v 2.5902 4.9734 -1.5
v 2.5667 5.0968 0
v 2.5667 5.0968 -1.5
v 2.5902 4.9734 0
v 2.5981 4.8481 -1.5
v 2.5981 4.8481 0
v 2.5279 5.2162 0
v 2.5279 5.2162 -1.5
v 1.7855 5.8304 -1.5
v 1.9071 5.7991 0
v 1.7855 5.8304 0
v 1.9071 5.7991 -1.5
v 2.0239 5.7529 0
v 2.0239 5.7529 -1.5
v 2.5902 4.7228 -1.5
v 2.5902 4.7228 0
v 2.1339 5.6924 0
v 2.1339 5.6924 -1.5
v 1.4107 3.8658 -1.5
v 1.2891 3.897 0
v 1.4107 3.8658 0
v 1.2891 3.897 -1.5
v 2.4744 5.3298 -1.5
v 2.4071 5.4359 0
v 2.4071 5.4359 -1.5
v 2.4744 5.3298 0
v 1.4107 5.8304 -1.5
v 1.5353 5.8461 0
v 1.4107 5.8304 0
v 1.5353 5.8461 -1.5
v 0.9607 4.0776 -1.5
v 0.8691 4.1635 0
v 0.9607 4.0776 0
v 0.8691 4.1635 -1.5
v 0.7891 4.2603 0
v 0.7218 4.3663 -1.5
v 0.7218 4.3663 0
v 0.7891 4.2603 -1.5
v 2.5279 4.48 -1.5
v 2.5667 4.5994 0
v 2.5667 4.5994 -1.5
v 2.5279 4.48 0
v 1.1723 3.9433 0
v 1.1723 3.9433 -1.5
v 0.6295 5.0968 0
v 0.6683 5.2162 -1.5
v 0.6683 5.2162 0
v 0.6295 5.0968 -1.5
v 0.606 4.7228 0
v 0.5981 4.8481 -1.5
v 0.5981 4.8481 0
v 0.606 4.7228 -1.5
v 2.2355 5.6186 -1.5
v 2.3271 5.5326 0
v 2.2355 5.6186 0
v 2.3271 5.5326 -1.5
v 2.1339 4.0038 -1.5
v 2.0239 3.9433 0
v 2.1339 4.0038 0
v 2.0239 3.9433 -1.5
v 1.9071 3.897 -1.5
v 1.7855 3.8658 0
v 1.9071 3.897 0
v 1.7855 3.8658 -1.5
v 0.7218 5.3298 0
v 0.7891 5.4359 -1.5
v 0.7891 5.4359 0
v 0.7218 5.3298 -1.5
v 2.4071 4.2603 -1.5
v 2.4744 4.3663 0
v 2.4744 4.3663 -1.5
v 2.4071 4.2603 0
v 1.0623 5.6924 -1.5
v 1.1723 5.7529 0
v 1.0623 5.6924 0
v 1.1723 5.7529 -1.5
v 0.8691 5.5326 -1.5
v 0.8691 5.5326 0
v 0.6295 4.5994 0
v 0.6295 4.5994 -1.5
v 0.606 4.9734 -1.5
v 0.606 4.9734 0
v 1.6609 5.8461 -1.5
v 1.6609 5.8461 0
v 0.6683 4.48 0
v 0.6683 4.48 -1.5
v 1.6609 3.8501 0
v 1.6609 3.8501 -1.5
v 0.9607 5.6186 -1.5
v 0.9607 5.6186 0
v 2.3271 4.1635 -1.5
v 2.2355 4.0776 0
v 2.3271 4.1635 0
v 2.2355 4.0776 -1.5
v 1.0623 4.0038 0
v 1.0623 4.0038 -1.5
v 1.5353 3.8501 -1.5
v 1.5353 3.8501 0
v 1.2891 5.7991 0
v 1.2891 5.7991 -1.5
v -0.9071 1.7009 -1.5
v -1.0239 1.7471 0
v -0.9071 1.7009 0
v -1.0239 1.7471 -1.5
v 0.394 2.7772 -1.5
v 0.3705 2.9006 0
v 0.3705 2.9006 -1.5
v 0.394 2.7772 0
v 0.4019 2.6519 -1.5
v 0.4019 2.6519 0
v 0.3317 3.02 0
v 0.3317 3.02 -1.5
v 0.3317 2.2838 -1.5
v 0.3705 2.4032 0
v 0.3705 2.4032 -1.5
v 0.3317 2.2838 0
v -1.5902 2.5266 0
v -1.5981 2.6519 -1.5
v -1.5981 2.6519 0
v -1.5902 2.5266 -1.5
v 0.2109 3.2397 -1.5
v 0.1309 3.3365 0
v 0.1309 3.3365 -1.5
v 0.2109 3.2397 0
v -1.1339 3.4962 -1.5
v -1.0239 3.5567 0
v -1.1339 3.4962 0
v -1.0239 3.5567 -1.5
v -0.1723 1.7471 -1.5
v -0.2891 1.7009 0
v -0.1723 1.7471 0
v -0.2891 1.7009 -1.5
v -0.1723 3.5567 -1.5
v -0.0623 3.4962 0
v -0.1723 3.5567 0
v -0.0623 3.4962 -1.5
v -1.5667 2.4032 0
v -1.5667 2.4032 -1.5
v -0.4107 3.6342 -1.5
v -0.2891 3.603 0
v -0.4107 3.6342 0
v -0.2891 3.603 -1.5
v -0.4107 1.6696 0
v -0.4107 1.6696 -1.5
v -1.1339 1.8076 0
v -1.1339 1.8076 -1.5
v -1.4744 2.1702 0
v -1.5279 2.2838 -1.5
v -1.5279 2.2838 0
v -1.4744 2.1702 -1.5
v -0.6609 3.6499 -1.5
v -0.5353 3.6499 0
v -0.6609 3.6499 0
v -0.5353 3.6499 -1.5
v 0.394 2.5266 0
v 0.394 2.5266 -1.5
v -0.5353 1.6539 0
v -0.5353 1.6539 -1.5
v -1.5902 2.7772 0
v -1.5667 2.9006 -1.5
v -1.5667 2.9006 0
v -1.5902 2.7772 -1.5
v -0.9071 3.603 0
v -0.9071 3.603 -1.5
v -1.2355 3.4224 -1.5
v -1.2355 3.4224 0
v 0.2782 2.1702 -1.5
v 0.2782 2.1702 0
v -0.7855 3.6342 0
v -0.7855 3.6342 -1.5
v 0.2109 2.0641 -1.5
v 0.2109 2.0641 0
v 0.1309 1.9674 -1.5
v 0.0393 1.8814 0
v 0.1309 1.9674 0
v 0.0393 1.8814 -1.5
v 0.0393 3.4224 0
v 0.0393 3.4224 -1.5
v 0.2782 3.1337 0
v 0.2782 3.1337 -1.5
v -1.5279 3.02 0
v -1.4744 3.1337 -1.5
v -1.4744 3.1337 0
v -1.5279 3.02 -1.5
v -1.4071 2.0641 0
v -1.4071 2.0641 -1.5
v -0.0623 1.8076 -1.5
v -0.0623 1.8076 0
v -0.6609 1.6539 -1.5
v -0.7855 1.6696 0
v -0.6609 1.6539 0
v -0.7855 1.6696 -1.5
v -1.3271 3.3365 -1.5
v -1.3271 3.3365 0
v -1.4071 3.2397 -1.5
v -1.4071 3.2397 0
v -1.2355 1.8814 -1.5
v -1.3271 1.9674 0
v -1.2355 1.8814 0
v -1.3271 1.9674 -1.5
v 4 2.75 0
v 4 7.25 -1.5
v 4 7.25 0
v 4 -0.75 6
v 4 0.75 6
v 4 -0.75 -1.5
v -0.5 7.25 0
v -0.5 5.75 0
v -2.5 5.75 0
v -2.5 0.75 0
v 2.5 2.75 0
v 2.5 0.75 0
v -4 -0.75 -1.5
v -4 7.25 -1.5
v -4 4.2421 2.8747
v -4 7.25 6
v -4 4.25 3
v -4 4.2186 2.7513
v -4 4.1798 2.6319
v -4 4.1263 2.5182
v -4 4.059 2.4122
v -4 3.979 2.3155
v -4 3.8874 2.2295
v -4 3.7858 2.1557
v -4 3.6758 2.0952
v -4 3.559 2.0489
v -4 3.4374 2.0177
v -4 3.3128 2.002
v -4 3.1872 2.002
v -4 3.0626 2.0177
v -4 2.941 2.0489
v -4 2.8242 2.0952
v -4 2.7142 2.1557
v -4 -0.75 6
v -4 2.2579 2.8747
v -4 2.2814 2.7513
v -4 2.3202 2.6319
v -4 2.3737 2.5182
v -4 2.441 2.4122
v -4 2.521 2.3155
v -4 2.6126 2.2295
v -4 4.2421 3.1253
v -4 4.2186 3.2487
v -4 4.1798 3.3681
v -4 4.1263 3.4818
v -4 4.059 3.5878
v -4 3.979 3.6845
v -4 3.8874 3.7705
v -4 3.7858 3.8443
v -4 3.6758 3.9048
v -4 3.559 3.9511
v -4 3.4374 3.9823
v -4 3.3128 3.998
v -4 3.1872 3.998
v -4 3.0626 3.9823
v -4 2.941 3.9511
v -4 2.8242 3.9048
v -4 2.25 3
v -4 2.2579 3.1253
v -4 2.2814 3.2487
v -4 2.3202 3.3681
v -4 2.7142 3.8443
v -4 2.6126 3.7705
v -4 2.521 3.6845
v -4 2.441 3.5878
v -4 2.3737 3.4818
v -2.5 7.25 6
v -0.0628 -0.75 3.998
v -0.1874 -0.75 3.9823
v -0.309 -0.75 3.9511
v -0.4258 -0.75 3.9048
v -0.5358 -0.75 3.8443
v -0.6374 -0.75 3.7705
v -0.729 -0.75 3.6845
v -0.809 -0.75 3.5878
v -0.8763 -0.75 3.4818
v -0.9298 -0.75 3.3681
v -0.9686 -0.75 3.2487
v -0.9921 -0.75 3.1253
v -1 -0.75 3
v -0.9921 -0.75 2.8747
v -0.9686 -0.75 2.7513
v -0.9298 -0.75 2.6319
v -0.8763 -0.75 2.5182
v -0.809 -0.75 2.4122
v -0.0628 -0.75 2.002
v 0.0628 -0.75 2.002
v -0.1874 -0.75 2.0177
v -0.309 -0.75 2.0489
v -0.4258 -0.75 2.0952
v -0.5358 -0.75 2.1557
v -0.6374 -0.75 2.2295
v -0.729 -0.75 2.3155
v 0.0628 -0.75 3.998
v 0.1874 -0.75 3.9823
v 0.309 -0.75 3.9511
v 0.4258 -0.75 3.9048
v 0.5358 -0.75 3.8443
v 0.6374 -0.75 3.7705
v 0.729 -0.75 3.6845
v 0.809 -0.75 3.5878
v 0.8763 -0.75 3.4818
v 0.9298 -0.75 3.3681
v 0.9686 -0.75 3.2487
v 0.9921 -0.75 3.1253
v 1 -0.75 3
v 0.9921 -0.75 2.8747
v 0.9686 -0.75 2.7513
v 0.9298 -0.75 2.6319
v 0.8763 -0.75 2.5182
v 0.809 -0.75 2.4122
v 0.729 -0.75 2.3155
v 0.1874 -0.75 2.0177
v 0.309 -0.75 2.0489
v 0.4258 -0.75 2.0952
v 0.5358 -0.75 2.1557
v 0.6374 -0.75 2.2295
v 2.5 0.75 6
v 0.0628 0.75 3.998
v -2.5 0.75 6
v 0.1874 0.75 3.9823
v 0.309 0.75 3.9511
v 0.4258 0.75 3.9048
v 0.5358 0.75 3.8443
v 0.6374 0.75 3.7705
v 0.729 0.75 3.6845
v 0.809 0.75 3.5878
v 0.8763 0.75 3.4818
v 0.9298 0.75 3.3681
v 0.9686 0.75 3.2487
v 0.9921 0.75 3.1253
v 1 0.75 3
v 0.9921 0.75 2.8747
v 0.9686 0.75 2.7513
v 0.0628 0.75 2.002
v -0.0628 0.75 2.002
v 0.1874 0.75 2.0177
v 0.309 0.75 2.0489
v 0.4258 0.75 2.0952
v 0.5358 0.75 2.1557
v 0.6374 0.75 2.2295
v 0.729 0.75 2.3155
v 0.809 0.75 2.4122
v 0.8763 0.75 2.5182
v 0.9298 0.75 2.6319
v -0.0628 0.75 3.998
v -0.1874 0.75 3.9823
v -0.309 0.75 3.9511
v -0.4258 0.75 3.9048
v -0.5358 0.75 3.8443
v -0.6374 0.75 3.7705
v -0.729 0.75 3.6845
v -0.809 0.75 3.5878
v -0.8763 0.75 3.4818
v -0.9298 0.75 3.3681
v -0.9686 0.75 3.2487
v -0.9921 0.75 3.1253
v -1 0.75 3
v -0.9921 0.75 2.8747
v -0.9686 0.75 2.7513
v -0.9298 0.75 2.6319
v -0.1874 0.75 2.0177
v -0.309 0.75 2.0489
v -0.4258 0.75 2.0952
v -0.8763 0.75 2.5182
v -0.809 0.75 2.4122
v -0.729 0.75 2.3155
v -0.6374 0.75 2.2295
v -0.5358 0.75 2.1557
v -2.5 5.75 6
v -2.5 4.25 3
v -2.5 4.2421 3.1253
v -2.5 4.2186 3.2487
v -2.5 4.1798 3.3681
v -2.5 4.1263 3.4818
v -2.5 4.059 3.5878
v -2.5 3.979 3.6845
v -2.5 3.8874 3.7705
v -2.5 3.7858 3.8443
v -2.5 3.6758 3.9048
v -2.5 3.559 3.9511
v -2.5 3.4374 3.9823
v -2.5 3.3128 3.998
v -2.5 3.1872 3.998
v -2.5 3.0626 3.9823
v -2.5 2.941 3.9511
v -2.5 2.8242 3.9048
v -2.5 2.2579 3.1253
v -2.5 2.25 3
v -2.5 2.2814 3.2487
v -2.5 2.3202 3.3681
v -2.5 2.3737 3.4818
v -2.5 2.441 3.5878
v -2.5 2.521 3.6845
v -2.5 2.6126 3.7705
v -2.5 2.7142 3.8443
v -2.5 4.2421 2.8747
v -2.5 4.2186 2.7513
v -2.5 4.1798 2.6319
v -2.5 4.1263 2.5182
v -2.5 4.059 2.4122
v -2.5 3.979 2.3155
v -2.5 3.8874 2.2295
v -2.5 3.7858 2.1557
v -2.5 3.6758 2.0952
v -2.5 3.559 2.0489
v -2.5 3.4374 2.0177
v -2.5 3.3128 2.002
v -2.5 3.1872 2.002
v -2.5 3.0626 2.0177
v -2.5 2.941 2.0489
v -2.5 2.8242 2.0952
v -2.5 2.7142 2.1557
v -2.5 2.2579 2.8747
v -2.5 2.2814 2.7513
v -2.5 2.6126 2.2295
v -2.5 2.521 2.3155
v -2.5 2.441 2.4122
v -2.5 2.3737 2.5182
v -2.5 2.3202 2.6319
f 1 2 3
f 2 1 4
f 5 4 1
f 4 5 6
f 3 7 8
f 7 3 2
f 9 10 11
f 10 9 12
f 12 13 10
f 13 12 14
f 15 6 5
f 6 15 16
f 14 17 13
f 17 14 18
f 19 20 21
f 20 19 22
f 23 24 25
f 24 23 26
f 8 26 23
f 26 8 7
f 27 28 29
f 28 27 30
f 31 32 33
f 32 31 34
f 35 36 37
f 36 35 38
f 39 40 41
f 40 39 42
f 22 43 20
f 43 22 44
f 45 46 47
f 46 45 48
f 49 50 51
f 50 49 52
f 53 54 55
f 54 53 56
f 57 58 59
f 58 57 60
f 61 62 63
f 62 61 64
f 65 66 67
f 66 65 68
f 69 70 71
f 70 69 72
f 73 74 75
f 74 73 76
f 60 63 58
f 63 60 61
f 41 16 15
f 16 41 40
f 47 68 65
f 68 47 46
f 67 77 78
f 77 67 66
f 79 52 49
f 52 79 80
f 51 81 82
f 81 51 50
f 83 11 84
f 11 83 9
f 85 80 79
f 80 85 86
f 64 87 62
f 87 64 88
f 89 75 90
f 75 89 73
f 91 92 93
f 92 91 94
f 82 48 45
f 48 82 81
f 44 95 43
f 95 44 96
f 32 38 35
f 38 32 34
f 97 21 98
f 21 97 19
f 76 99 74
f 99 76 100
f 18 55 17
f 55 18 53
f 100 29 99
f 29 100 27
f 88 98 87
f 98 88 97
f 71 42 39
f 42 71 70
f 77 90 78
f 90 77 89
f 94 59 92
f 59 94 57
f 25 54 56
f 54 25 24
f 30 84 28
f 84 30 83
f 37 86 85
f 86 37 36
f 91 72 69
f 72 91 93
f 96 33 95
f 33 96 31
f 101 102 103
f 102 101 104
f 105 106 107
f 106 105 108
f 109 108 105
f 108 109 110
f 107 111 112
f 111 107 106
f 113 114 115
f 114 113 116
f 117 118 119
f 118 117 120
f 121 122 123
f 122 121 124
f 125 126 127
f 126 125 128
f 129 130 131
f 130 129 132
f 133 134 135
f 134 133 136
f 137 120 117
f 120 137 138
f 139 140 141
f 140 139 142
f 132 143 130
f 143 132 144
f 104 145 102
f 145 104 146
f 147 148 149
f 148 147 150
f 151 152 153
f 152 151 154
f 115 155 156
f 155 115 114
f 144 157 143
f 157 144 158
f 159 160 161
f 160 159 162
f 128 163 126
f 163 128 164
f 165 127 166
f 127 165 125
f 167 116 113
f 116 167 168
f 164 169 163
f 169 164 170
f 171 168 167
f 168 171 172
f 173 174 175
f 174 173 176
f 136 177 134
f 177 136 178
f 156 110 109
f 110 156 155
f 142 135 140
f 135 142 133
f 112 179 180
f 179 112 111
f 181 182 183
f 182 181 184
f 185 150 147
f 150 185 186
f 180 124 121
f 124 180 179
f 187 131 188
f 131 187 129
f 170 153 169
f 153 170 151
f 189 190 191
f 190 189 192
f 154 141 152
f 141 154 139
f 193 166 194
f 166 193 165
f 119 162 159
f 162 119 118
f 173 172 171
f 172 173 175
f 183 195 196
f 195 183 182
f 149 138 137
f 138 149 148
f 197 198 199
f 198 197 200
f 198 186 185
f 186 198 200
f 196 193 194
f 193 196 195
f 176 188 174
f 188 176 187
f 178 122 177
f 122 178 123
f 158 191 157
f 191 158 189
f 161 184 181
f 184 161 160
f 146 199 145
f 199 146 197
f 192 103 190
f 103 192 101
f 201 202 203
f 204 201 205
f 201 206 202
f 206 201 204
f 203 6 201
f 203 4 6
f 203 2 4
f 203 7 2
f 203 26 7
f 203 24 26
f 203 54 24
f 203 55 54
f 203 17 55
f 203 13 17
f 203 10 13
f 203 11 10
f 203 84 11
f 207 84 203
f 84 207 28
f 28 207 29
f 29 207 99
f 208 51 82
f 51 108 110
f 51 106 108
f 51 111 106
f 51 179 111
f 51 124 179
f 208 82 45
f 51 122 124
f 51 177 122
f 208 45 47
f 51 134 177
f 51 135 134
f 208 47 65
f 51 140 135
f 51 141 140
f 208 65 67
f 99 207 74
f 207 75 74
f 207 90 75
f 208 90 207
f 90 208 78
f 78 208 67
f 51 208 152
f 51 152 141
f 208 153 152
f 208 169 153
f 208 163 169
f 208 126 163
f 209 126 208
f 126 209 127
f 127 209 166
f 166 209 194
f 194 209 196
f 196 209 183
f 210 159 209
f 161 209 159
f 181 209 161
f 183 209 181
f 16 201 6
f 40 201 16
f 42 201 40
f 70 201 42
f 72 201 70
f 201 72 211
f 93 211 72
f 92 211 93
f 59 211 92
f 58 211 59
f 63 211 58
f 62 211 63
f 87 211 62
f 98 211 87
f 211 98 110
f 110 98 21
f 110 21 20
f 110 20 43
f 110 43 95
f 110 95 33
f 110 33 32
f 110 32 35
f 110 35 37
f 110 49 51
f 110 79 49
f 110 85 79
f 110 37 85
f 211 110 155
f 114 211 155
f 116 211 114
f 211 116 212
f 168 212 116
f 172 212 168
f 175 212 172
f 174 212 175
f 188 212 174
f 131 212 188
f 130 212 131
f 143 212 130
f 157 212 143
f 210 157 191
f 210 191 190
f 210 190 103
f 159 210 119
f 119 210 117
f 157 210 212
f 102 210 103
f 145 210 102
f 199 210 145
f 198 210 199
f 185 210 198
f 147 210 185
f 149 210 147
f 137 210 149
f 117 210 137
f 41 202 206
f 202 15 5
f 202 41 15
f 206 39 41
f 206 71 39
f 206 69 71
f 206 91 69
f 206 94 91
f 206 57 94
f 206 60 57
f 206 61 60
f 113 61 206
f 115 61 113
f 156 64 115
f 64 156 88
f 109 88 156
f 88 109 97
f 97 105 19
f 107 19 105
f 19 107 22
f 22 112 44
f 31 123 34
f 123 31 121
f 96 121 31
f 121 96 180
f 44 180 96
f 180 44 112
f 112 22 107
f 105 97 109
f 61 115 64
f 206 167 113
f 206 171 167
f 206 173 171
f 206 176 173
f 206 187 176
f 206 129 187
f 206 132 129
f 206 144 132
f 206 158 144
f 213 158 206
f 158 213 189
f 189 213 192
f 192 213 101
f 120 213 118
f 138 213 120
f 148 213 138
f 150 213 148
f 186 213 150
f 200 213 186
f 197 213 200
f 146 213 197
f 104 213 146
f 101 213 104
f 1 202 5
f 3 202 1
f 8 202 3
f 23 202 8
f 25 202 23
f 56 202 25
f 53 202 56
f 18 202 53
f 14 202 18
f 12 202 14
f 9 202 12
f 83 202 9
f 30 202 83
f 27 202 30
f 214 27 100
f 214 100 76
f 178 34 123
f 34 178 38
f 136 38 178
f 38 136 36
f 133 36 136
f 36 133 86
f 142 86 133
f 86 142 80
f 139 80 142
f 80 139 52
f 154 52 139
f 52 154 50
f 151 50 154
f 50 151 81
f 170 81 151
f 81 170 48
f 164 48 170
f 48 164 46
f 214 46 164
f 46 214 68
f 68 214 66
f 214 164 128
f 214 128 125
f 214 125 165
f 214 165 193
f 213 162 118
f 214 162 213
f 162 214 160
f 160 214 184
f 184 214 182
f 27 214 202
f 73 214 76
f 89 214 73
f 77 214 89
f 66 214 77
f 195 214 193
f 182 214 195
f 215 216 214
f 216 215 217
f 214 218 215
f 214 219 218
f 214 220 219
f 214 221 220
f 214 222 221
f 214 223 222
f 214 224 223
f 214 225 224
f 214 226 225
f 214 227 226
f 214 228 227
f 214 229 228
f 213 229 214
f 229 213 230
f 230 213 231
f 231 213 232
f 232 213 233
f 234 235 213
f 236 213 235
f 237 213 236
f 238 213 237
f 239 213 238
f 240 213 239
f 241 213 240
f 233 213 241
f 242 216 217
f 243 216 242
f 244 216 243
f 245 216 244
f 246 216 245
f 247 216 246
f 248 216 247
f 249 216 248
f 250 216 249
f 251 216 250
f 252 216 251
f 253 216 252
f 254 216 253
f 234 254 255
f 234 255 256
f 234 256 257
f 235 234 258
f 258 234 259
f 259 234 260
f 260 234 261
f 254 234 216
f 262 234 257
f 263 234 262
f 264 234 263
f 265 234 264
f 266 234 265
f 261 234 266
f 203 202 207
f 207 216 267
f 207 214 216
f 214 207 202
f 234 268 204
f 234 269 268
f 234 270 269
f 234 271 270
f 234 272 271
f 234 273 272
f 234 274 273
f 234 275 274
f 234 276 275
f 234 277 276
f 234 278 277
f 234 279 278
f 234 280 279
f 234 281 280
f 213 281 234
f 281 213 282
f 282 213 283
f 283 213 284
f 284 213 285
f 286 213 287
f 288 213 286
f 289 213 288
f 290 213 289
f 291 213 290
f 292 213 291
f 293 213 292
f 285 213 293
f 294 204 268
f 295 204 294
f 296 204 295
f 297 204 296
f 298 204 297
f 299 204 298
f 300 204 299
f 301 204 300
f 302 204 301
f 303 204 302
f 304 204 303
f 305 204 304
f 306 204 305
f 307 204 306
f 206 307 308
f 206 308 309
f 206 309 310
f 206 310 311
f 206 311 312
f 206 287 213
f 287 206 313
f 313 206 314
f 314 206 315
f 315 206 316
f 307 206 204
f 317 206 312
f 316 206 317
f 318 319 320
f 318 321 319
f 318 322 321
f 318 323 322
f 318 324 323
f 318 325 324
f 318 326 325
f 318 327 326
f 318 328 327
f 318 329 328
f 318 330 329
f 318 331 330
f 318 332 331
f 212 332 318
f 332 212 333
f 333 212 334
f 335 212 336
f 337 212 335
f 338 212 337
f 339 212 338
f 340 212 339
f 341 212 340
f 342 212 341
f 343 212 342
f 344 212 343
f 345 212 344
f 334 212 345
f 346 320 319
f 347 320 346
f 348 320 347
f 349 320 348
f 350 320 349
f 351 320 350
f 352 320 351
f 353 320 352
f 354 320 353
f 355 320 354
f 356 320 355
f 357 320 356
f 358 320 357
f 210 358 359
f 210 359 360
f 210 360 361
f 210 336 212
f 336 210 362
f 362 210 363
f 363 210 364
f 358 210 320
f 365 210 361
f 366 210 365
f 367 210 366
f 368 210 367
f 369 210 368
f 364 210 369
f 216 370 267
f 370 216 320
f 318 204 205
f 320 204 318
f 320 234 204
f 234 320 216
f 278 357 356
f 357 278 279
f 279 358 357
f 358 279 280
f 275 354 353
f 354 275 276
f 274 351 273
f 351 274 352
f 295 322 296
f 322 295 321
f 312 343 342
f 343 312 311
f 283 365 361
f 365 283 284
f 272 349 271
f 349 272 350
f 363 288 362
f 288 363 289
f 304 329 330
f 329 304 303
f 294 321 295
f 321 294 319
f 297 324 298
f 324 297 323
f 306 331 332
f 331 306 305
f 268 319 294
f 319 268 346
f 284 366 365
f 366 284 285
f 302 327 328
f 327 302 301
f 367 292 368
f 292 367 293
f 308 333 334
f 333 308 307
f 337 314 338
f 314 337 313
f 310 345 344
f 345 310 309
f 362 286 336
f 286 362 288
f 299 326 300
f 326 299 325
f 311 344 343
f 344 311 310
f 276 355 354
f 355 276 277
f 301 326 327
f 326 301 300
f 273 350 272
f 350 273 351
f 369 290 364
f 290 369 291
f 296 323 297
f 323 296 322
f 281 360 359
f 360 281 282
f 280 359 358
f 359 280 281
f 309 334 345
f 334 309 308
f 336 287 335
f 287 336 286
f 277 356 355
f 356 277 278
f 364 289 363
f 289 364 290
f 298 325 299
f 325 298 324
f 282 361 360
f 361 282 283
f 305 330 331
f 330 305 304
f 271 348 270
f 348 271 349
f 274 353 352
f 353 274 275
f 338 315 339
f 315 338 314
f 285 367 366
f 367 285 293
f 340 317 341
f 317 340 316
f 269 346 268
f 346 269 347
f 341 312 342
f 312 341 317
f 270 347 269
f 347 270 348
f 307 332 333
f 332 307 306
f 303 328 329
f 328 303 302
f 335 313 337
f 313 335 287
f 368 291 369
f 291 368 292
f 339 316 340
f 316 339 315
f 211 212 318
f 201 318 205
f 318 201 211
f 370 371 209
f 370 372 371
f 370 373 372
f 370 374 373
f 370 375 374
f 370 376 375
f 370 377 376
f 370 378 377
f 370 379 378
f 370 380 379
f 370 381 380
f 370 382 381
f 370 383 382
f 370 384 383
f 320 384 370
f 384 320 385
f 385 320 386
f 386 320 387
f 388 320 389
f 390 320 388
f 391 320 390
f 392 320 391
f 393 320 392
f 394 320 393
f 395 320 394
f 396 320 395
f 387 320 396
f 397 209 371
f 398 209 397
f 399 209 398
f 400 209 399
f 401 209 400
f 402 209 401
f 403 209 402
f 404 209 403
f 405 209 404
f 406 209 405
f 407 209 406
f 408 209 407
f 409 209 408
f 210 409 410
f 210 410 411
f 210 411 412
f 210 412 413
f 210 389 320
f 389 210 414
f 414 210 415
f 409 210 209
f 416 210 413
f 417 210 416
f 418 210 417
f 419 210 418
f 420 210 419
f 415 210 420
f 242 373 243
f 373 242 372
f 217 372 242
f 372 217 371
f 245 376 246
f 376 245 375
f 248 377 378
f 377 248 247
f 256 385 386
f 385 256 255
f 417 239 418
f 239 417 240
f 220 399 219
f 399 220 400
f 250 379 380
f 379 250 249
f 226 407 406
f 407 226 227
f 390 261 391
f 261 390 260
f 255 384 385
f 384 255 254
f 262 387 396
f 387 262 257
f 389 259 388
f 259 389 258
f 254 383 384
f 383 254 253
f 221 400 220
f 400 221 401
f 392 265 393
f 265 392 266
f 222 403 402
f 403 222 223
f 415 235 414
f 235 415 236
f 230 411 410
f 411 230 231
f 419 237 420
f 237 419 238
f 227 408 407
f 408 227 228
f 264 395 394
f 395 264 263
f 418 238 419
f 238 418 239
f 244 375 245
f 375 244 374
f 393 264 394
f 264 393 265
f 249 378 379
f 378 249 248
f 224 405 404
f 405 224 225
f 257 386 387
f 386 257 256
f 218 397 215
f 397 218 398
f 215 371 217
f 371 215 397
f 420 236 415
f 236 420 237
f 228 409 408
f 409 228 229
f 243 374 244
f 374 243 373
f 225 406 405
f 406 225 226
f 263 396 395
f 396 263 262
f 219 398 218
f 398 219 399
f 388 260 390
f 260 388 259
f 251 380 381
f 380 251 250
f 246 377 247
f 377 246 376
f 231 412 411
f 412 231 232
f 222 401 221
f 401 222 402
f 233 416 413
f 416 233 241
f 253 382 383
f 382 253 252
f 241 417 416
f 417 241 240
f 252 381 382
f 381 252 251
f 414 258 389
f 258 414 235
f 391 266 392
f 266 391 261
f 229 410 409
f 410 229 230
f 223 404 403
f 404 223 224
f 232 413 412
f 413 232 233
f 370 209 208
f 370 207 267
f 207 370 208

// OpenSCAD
fineness=50;
plate_thickness = 1;
//plate_width = 35*4 + 10;
plate_height = 8;
plate_width = 8;

//led_lead_dia = 2;
//led_lead_sep = 3;
//led_sep = 5.5;
//hoz_bar_sep = 20;
//vert_bar_sep = 20;
//post_height = 4;
//post_dia = 4;
//post_cutout_width = 1;
//post_hoz_sep = 10;
//post_vert_sep = 20;
//led_dia = 5;
//pad_dia=5;
//digit_sep=10;

// mounting lugs
lug_height=6;
lug_width=8;
lug_hole_dia=2;
lug_thickness=1.5;
lug_side_web=2;
lug_top_web=6;
lug_corner_offset=3;

body();

module body() {
bottom();
mounting_lugs();

module bottom(){
hole_offset = 2.54/2;
hole_diag_spacing = sqrt(2*pow(2,hole_offset));
translate([0,plate_width/2-lug_thickness/2,-lug_thickness/2]){
difference(){
cube (size = [plate_width,plate_height,lug_thickness], center = true);
union(){
translate([0.5+hole_diag_spacing/2,0.5+hole_diag_spacing/2,-2]){cylinder(h=2+lug_thickness,r=lug_hole_dia/2,$fn=fineness);}
translate([0.5+-hole_diag_spacing/2,0.5-hole_diag_spacing/2,-2]){cylinder(h=2+lug_thickness,r=lug_hole_dia/2,$fn=fineness);}
}
}
}
}

module mounting_lugs() {
// top and bottom
translate([0,0,lug_height/2]){
rotate([90,0,180]){lug(web_left=1);}
}

translate([-plate_width/2+lug_thickness/2,plate_height/2-lug_thickness/2,lug_height/2]){
rotate([90,0,90]){lug(web_left=0);}
}

}

module lug(web_left=1) {
difference(){
cube (size = [lug_width,lug_height,lug_thickness], center = true);
translate([-0,0,-2]){cylinder(h=2+lug_thickness,r=lug_hole_dia/2,$fn=fineness);}
}

// webbing
if (web_left){
translate([-lug_width/2+lug_thickness/2,-lug_height/2+lug_top_web/2,lug_thickness/2+lug_side_web/2]) {support_web();}
} else {
translate([lug_width/2-lug_thickness/2,-lug_height/2+lug_top_web/2,lug_thickness/2+lug_side_web/2]) {support_web();}
}
}

module support_web(){
diag=sqrt(pow(2,lug_top_web)+pow(2,lug_side_web));
rot=atan(lug_side_web/lug_top_web);
difference(){
cube (size = [lug_thickness,lug_top_web,lug_side_web], center=true);
translate([0,lug_top_web/2,-lug_side_web/2]){ // 0,0,0 lug_thickness/2,lug_top_web/2,0
  rotate(a=[-rot,0,0]){
    translate([0,-lug_top_web/2,lug_side_web/2]){ // 0,0,0 -lug_thickness/2,-lug_top_web/2,0
       translate([0.1,(-diag+lug_top_web)/2,0]){
        cube (size = [lug_thickness+0.5,diag,lug_side_web], center=true);
      }
    }
  }
}
}
}
}
